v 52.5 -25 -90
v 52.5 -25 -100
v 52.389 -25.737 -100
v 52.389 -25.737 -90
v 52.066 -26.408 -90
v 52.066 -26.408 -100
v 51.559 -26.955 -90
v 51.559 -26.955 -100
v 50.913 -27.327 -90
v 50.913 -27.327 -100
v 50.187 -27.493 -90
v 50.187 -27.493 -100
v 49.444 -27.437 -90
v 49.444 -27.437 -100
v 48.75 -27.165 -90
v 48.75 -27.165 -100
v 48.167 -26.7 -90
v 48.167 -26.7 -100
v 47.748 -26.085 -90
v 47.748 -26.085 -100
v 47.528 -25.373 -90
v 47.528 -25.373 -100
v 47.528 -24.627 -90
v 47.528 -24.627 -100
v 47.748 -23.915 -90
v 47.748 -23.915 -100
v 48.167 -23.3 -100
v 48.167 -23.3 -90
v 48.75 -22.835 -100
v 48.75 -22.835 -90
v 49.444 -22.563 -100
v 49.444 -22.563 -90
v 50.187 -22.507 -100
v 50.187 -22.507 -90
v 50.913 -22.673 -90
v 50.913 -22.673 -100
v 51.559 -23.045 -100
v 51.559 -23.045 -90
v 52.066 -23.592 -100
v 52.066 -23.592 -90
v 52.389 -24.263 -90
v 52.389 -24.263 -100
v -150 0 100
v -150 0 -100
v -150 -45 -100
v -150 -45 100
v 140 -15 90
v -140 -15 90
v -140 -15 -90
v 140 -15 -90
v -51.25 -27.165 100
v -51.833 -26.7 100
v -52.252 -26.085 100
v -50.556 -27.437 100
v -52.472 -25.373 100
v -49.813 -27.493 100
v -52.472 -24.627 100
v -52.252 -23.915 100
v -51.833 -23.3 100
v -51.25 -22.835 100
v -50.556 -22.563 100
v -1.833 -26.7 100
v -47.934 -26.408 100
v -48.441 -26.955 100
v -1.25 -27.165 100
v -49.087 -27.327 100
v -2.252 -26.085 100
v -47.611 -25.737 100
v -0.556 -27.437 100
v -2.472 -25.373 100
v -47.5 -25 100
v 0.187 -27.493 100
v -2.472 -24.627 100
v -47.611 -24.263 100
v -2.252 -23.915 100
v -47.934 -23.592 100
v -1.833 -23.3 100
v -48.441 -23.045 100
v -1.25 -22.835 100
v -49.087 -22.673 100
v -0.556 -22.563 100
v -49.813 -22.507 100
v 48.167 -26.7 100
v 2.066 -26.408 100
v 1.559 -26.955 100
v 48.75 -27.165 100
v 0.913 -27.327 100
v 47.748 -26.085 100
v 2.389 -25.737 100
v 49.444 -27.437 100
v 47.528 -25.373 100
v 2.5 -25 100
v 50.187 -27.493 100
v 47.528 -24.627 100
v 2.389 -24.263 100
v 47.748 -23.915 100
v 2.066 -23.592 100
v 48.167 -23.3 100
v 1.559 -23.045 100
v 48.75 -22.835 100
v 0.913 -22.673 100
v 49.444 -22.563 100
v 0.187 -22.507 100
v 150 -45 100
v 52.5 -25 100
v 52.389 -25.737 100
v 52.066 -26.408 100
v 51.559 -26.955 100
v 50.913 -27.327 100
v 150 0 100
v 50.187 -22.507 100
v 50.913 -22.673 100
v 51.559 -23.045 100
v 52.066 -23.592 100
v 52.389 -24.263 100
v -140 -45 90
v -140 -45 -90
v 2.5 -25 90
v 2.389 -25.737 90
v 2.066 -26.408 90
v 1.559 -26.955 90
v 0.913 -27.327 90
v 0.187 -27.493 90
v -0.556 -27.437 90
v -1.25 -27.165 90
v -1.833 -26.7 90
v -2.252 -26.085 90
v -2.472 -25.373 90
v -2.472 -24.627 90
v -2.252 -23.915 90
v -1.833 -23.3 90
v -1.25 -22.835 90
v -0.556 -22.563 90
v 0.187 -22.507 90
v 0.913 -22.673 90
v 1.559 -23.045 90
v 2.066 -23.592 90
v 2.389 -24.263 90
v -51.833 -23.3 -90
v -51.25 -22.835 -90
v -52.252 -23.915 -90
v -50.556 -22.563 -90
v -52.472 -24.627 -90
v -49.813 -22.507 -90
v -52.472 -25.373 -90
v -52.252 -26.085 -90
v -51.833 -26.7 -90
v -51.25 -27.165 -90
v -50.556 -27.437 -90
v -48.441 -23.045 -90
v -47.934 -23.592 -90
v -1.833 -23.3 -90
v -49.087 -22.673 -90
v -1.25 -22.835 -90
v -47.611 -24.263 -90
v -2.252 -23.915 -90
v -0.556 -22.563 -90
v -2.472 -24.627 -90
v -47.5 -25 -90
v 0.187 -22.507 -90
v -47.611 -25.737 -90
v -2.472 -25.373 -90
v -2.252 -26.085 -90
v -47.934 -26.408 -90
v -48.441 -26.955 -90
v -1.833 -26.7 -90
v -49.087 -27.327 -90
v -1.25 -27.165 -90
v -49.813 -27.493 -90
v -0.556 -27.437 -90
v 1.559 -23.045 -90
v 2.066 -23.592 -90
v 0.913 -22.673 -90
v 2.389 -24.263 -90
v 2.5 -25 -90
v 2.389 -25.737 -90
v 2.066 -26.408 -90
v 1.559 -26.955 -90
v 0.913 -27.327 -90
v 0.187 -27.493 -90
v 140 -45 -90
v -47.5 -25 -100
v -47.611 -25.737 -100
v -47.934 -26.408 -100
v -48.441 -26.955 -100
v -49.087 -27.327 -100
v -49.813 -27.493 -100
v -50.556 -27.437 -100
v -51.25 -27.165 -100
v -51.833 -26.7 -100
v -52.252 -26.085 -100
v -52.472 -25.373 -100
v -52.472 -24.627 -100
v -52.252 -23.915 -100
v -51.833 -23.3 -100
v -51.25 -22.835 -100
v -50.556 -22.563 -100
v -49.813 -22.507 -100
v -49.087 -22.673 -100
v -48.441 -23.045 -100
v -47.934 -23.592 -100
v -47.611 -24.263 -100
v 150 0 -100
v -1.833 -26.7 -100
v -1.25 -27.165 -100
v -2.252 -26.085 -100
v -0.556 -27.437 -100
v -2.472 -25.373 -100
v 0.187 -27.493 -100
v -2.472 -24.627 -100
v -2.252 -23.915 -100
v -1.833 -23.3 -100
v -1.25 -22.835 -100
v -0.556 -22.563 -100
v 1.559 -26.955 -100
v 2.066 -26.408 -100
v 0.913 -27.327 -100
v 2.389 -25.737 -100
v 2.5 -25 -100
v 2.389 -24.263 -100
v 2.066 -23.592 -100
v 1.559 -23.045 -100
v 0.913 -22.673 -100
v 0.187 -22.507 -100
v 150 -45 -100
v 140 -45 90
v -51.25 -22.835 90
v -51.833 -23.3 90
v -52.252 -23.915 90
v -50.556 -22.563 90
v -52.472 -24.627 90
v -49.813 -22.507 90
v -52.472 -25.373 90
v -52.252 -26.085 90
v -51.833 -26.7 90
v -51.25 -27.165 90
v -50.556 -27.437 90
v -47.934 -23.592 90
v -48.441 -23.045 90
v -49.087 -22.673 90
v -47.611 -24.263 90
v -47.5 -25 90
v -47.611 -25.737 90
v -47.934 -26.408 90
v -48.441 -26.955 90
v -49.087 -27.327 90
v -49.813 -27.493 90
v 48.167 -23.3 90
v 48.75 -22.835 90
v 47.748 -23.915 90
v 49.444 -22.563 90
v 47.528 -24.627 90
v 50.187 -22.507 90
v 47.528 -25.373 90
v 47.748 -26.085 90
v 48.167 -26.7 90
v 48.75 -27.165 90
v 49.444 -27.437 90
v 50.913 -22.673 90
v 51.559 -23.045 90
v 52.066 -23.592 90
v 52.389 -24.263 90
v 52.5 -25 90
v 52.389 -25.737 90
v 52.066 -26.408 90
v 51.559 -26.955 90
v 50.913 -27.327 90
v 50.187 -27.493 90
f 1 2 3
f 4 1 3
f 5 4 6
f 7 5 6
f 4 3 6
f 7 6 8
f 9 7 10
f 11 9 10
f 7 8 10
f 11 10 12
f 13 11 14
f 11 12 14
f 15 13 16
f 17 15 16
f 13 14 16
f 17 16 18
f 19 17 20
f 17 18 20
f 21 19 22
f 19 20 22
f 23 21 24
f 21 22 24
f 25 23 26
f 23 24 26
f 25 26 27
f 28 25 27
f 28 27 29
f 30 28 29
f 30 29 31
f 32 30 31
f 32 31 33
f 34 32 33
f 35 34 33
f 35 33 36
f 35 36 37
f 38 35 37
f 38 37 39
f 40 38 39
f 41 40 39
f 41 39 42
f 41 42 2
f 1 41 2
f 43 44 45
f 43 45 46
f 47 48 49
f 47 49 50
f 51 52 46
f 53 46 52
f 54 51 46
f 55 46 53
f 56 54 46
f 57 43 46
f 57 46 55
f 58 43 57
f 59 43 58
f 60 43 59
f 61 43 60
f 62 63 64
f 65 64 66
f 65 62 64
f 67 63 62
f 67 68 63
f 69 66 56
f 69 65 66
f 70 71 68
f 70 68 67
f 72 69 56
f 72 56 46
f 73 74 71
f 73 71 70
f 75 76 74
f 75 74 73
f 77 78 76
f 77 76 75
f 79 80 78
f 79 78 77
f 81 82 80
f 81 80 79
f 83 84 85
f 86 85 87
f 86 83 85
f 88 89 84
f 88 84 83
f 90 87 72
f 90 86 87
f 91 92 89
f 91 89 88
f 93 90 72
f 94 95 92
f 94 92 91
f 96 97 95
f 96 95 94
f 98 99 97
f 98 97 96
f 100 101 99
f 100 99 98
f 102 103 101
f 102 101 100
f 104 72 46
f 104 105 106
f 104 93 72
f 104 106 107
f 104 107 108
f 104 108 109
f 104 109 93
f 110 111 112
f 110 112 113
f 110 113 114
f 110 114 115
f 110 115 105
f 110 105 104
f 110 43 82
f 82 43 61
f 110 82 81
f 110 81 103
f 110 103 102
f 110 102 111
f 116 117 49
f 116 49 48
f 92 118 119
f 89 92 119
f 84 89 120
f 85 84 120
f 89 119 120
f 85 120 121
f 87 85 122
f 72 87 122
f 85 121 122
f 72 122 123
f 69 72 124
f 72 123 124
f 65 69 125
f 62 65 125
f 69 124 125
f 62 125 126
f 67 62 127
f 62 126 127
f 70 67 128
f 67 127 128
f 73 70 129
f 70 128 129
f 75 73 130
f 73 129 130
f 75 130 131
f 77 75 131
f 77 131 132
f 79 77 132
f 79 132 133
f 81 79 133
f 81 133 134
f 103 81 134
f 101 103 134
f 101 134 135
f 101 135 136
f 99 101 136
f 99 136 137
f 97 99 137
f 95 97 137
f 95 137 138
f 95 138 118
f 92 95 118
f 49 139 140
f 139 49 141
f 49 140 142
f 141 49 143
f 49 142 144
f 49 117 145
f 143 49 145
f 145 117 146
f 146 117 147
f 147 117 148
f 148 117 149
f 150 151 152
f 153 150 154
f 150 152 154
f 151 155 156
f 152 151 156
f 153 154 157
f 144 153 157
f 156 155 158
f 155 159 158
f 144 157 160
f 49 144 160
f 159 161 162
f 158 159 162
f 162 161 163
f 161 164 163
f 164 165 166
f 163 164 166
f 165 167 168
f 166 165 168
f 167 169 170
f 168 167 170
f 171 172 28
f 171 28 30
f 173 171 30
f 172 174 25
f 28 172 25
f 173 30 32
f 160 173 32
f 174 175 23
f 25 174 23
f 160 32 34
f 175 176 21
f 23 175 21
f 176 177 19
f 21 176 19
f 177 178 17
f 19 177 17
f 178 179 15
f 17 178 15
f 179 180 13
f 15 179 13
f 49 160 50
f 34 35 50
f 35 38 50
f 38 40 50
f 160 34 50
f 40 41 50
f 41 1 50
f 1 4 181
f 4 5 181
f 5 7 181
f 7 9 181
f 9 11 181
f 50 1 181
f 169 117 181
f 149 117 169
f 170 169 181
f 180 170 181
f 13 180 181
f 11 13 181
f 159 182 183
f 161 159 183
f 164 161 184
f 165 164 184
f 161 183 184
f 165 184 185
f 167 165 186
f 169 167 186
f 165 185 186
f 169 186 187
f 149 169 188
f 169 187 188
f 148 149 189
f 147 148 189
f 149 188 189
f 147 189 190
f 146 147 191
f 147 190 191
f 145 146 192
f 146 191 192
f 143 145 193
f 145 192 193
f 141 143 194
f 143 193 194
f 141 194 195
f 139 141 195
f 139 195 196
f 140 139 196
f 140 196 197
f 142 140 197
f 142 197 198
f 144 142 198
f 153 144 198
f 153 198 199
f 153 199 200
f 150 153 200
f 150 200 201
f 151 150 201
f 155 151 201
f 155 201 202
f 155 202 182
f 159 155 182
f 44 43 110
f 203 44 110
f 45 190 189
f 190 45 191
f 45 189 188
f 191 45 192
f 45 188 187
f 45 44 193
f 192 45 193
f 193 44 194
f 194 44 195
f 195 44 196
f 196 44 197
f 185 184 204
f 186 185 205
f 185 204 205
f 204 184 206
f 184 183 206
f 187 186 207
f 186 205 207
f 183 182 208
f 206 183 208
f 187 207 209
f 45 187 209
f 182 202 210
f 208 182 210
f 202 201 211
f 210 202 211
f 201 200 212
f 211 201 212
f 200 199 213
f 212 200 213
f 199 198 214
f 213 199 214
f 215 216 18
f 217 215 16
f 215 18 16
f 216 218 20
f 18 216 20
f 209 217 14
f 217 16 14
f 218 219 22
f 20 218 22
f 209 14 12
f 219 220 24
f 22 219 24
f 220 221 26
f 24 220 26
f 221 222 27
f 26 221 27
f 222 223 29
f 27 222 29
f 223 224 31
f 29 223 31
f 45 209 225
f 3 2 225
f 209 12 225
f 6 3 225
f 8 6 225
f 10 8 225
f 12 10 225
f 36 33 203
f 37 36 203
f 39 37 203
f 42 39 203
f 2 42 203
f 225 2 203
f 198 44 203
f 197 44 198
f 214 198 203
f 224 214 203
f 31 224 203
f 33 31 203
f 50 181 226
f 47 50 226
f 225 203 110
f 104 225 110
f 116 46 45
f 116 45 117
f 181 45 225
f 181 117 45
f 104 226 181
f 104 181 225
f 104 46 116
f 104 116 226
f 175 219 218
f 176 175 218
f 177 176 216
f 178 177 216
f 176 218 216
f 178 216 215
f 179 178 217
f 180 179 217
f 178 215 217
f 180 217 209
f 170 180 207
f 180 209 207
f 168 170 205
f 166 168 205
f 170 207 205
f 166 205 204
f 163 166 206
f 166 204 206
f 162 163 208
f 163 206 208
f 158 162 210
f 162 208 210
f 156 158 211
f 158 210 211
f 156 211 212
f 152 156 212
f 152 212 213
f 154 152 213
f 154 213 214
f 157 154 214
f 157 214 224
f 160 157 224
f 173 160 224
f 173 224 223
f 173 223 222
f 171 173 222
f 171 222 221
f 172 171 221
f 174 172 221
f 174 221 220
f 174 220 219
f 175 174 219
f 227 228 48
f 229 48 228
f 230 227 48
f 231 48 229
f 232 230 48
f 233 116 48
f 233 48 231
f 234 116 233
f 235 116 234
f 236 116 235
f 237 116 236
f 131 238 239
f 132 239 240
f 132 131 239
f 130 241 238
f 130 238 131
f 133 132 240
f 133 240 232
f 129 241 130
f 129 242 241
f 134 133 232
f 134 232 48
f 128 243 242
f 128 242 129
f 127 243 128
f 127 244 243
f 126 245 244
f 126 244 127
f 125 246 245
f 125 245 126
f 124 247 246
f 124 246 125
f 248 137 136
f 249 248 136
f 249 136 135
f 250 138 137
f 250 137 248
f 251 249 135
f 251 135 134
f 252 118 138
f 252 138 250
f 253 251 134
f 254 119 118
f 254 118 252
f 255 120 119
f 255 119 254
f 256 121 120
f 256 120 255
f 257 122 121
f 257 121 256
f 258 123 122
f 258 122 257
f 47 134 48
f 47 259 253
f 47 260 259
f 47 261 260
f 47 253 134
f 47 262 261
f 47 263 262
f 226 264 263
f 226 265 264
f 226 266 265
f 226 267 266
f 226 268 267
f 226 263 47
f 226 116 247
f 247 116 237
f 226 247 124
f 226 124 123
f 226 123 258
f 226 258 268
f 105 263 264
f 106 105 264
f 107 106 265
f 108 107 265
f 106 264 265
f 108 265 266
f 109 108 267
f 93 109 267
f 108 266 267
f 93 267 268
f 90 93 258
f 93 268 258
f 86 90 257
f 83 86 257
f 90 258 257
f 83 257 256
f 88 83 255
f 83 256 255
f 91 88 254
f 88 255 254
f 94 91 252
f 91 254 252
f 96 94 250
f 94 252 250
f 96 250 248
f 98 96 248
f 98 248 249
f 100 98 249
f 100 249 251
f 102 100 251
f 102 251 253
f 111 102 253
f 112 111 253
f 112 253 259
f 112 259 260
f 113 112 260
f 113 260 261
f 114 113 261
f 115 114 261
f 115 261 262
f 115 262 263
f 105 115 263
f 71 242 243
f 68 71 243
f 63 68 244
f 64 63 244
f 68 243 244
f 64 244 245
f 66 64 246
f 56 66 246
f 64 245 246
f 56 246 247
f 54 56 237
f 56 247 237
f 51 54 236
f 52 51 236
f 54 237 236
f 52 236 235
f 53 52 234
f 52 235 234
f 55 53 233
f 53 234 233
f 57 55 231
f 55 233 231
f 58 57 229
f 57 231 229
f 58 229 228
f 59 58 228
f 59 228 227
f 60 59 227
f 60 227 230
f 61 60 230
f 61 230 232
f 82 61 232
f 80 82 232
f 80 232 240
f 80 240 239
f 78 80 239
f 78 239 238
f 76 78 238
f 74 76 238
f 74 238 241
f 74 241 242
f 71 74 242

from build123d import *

# Parameters (mm, degrees)
F0_W     = 300
F0_H     = 200
F1_DEPTH = 45
F2_W     = 280
F2_H     = 180
F3_DEPTH = 30
F4_R     = 2.5
F5_DEPTH = 200.001


with BuildPart() as f1:
    # F0 (on Front) → F1 (new body)
    with BuildSketch(Plane.XZ):
        Rectangle(F0_W, F0_H)
    extrude(amount=F1_DEPTH)

    # F2 (on face) → F3 (cut)
    with BuildSketch(Plane.XZ.offset(45)):
        Rectangle(F2_W, F2_H)
    extrude(amount=-F3_DEPTH, mode=Mode.SUBTRACT)

    # F4 (on face) → F5 (cut, through all)
    with BuildSketch(Plane(origin=(0, 0, -100), x_dir=(1, 0, 0), z_dir=(0, 0, -1))):
        with Locations((-50, 25)):
            Circle(F4_R)
        with Locations((0, 25)):
            Circle(F4_R)
        with Locations((50, 25)):
            Circle(F4_R)
    extrude(amount=-F5_DEPTH, mode=Mode.SUBTRACT)


solid = f1.part
